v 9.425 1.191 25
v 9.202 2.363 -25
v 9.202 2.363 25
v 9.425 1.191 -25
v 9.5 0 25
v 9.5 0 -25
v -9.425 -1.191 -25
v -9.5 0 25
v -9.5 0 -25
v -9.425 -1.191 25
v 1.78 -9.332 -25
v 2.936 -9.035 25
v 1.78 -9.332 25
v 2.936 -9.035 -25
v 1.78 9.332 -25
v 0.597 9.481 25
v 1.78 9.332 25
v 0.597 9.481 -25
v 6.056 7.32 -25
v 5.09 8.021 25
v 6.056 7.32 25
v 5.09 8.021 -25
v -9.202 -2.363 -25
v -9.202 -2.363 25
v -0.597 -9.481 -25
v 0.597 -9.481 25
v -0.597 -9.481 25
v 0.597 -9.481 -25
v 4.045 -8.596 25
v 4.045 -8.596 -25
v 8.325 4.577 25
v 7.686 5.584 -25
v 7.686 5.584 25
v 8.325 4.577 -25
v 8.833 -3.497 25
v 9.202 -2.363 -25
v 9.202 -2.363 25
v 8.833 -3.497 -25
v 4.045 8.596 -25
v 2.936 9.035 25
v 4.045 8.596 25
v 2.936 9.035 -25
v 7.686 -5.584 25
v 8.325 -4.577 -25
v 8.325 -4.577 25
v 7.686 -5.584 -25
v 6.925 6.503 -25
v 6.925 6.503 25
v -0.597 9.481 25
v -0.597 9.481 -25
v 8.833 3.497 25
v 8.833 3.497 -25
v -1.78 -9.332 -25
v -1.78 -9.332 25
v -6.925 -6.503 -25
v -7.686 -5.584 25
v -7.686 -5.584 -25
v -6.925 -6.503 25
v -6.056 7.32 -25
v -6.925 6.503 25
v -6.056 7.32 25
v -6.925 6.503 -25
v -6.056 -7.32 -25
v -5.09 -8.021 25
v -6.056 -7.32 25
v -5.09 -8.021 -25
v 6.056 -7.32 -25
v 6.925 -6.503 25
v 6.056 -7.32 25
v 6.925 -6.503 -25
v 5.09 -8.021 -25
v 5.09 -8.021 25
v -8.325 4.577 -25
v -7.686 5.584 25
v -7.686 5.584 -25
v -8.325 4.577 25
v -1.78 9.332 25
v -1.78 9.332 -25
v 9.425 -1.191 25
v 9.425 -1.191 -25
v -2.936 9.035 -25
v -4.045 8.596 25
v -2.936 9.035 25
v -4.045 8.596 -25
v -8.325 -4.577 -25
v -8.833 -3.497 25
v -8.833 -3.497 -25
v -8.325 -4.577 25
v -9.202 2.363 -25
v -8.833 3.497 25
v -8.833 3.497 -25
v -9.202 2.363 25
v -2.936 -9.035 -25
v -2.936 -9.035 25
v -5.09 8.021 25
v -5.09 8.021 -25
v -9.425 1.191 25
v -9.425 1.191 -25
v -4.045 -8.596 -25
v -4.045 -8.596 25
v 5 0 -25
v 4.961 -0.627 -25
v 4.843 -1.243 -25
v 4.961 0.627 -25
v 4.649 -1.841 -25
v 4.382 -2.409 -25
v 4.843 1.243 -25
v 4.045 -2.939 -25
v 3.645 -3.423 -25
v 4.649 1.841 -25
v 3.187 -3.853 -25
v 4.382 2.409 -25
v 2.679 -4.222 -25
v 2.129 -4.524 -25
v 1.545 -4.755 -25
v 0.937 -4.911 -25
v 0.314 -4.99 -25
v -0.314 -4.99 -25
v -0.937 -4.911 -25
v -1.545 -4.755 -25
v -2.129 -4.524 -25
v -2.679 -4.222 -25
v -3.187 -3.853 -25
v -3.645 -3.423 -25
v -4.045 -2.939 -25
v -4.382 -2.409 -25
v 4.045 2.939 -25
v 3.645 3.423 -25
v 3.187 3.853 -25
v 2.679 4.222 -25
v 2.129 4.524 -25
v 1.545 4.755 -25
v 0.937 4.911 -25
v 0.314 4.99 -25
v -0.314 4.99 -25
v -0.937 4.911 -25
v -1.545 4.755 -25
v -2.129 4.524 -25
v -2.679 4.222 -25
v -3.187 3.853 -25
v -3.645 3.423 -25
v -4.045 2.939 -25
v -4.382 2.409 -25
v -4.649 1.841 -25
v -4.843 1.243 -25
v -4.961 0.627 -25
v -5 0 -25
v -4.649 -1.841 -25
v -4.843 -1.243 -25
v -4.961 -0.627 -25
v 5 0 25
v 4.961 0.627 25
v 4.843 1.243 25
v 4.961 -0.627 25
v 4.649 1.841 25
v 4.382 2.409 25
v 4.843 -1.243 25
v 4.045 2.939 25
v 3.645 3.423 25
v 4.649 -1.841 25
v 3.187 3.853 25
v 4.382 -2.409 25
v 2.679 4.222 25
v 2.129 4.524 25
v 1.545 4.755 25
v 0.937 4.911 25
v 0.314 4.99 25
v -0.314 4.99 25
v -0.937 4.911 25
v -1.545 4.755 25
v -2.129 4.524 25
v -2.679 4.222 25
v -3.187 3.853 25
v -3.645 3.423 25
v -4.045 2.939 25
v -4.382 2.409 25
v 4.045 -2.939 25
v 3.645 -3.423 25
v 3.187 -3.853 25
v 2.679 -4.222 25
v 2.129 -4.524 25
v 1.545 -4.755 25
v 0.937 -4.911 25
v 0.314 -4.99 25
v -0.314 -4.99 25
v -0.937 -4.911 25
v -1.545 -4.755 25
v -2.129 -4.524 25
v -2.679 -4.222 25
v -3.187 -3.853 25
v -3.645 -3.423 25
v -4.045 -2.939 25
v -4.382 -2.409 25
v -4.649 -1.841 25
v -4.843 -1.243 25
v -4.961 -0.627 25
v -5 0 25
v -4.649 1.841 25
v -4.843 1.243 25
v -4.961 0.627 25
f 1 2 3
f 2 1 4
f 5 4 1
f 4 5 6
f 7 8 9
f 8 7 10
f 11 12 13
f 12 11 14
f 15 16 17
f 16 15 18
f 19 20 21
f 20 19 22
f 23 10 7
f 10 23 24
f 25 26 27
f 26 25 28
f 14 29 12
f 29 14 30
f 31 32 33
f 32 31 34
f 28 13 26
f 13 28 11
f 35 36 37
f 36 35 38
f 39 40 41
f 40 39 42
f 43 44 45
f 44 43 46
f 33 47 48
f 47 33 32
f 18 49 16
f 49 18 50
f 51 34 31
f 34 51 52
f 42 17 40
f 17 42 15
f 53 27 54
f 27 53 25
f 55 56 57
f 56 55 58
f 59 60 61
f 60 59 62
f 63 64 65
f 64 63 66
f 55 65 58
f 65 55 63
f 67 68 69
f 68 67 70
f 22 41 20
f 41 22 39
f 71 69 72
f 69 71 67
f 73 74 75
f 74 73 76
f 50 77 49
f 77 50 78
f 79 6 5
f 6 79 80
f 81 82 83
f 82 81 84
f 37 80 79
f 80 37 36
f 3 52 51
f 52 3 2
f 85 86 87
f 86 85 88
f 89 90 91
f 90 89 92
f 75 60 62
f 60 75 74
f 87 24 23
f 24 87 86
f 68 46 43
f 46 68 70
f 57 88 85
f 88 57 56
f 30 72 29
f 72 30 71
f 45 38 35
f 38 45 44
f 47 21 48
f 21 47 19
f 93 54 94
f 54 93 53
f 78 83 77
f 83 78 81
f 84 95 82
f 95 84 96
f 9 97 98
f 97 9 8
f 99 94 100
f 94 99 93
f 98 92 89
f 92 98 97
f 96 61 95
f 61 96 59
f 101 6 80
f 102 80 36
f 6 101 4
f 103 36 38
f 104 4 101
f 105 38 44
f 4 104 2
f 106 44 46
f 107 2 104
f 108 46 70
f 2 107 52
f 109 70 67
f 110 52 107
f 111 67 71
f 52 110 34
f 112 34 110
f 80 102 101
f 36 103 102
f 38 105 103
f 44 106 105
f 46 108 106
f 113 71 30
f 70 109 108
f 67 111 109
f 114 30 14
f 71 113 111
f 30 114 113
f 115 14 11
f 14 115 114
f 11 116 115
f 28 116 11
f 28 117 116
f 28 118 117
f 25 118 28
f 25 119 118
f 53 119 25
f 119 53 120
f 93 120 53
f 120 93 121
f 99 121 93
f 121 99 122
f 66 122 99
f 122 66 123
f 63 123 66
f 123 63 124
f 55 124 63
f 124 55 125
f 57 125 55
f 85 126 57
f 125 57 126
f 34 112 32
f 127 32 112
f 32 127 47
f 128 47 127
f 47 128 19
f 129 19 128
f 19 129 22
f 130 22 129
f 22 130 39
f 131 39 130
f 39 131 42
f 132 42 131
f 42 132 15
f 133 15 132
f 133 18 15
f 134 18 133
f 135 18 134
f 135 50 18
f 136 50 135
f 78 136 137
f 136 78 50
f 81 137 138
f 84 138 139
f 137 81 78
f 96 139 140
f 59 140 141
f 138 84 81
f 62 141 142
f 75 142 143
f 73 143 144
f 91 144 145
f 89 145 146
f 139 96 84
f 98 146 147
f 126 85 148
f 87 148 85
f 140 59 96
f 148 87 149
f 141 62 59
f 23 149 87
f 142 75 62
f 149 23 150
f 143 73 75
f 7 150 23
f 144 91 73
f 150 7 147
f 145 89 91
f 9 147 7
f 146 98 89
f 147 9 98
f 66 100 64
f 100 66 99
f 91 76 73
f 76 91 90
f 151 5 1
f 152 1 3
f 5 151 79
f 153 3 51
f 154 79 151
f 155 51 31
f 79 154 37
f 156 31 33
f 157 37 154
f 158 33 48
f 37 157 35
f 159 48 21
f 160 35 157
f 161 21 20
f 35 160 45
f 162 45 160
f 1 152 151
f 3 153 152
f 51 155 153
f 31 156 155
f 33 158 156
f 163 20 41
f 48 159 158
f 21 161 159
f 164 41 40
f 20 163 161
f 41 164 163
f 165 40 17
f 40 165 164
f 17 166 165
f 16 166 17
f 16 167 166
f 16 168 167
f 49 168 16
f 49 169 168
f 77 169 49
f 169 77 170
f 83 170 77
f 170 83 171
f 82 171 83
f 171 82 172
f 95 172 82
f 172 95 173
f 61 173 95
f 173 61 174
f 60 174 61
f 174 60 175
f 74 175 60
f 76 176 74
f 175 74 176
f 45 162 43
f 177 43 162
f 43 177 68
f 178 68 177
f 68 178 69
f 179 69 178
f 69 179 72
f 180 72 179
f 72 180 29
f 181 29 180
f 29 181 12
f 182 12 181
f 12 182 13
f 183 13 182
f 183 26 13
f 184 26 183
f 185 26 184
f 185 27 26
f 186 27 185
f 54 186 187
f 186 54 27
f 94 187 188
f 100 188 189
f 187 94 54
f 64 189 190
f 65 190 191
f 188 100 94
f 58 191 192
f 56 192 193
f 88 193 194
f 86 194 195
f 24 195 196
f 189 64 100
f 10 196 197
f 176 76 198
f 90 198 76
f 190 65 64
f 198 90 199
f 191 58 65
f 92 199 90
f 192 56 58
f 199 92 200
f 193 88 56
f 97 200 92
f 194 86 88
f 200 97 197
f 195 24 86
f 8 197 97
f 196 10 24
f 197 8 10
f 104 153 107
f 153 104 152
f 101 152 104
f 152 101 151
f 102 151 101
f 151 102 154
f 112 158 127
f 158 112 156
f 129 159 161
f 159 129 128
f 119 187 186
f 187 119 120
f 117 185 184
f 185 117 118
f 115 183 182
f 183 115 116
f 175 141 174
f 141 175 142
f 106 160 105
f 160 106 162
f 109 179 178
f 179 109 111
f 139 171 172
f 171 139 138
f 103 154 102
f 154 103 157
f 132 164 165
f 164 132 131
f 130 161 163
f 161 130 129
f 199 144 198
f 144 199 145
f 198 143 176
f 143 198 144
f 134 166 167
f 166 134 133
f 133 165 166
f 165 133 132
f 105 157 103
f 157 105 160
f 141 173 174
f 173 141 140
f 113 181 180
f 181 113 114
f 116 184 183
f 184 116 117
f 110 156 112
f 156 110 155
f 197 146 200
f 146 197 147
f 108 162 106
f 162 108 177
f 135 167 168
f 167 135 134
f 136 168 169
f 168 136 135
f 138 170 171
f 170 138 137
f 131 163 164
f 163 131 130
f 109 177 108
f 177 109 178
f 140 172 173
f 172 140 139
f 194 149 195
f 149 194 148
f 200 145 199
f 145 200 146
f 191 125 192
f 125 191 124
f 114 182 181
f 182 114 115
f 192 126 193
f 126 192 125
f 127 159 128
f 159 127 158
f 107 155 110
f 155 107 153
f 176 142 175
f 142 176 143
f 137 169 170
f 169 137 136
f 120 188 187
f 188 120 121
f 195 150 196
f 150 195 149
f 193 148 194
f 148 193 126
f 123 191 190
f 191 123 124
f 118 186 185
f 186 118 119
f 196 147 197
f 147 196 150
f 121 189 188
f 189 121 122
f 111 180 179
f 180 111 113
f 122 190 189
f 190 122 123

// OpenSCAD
$fn = 50;


difference() {
	union() {
		translate(v = [0, 0, -25.0000000000]) {
			cylinder(h = 50, r = 9.5000000000);
		}
	}
	union() {
		translate(v = [0, 0, -100.0000000000]) {
			cylinder(h = 200, r = 5.0000000000);
		}
	}
}
